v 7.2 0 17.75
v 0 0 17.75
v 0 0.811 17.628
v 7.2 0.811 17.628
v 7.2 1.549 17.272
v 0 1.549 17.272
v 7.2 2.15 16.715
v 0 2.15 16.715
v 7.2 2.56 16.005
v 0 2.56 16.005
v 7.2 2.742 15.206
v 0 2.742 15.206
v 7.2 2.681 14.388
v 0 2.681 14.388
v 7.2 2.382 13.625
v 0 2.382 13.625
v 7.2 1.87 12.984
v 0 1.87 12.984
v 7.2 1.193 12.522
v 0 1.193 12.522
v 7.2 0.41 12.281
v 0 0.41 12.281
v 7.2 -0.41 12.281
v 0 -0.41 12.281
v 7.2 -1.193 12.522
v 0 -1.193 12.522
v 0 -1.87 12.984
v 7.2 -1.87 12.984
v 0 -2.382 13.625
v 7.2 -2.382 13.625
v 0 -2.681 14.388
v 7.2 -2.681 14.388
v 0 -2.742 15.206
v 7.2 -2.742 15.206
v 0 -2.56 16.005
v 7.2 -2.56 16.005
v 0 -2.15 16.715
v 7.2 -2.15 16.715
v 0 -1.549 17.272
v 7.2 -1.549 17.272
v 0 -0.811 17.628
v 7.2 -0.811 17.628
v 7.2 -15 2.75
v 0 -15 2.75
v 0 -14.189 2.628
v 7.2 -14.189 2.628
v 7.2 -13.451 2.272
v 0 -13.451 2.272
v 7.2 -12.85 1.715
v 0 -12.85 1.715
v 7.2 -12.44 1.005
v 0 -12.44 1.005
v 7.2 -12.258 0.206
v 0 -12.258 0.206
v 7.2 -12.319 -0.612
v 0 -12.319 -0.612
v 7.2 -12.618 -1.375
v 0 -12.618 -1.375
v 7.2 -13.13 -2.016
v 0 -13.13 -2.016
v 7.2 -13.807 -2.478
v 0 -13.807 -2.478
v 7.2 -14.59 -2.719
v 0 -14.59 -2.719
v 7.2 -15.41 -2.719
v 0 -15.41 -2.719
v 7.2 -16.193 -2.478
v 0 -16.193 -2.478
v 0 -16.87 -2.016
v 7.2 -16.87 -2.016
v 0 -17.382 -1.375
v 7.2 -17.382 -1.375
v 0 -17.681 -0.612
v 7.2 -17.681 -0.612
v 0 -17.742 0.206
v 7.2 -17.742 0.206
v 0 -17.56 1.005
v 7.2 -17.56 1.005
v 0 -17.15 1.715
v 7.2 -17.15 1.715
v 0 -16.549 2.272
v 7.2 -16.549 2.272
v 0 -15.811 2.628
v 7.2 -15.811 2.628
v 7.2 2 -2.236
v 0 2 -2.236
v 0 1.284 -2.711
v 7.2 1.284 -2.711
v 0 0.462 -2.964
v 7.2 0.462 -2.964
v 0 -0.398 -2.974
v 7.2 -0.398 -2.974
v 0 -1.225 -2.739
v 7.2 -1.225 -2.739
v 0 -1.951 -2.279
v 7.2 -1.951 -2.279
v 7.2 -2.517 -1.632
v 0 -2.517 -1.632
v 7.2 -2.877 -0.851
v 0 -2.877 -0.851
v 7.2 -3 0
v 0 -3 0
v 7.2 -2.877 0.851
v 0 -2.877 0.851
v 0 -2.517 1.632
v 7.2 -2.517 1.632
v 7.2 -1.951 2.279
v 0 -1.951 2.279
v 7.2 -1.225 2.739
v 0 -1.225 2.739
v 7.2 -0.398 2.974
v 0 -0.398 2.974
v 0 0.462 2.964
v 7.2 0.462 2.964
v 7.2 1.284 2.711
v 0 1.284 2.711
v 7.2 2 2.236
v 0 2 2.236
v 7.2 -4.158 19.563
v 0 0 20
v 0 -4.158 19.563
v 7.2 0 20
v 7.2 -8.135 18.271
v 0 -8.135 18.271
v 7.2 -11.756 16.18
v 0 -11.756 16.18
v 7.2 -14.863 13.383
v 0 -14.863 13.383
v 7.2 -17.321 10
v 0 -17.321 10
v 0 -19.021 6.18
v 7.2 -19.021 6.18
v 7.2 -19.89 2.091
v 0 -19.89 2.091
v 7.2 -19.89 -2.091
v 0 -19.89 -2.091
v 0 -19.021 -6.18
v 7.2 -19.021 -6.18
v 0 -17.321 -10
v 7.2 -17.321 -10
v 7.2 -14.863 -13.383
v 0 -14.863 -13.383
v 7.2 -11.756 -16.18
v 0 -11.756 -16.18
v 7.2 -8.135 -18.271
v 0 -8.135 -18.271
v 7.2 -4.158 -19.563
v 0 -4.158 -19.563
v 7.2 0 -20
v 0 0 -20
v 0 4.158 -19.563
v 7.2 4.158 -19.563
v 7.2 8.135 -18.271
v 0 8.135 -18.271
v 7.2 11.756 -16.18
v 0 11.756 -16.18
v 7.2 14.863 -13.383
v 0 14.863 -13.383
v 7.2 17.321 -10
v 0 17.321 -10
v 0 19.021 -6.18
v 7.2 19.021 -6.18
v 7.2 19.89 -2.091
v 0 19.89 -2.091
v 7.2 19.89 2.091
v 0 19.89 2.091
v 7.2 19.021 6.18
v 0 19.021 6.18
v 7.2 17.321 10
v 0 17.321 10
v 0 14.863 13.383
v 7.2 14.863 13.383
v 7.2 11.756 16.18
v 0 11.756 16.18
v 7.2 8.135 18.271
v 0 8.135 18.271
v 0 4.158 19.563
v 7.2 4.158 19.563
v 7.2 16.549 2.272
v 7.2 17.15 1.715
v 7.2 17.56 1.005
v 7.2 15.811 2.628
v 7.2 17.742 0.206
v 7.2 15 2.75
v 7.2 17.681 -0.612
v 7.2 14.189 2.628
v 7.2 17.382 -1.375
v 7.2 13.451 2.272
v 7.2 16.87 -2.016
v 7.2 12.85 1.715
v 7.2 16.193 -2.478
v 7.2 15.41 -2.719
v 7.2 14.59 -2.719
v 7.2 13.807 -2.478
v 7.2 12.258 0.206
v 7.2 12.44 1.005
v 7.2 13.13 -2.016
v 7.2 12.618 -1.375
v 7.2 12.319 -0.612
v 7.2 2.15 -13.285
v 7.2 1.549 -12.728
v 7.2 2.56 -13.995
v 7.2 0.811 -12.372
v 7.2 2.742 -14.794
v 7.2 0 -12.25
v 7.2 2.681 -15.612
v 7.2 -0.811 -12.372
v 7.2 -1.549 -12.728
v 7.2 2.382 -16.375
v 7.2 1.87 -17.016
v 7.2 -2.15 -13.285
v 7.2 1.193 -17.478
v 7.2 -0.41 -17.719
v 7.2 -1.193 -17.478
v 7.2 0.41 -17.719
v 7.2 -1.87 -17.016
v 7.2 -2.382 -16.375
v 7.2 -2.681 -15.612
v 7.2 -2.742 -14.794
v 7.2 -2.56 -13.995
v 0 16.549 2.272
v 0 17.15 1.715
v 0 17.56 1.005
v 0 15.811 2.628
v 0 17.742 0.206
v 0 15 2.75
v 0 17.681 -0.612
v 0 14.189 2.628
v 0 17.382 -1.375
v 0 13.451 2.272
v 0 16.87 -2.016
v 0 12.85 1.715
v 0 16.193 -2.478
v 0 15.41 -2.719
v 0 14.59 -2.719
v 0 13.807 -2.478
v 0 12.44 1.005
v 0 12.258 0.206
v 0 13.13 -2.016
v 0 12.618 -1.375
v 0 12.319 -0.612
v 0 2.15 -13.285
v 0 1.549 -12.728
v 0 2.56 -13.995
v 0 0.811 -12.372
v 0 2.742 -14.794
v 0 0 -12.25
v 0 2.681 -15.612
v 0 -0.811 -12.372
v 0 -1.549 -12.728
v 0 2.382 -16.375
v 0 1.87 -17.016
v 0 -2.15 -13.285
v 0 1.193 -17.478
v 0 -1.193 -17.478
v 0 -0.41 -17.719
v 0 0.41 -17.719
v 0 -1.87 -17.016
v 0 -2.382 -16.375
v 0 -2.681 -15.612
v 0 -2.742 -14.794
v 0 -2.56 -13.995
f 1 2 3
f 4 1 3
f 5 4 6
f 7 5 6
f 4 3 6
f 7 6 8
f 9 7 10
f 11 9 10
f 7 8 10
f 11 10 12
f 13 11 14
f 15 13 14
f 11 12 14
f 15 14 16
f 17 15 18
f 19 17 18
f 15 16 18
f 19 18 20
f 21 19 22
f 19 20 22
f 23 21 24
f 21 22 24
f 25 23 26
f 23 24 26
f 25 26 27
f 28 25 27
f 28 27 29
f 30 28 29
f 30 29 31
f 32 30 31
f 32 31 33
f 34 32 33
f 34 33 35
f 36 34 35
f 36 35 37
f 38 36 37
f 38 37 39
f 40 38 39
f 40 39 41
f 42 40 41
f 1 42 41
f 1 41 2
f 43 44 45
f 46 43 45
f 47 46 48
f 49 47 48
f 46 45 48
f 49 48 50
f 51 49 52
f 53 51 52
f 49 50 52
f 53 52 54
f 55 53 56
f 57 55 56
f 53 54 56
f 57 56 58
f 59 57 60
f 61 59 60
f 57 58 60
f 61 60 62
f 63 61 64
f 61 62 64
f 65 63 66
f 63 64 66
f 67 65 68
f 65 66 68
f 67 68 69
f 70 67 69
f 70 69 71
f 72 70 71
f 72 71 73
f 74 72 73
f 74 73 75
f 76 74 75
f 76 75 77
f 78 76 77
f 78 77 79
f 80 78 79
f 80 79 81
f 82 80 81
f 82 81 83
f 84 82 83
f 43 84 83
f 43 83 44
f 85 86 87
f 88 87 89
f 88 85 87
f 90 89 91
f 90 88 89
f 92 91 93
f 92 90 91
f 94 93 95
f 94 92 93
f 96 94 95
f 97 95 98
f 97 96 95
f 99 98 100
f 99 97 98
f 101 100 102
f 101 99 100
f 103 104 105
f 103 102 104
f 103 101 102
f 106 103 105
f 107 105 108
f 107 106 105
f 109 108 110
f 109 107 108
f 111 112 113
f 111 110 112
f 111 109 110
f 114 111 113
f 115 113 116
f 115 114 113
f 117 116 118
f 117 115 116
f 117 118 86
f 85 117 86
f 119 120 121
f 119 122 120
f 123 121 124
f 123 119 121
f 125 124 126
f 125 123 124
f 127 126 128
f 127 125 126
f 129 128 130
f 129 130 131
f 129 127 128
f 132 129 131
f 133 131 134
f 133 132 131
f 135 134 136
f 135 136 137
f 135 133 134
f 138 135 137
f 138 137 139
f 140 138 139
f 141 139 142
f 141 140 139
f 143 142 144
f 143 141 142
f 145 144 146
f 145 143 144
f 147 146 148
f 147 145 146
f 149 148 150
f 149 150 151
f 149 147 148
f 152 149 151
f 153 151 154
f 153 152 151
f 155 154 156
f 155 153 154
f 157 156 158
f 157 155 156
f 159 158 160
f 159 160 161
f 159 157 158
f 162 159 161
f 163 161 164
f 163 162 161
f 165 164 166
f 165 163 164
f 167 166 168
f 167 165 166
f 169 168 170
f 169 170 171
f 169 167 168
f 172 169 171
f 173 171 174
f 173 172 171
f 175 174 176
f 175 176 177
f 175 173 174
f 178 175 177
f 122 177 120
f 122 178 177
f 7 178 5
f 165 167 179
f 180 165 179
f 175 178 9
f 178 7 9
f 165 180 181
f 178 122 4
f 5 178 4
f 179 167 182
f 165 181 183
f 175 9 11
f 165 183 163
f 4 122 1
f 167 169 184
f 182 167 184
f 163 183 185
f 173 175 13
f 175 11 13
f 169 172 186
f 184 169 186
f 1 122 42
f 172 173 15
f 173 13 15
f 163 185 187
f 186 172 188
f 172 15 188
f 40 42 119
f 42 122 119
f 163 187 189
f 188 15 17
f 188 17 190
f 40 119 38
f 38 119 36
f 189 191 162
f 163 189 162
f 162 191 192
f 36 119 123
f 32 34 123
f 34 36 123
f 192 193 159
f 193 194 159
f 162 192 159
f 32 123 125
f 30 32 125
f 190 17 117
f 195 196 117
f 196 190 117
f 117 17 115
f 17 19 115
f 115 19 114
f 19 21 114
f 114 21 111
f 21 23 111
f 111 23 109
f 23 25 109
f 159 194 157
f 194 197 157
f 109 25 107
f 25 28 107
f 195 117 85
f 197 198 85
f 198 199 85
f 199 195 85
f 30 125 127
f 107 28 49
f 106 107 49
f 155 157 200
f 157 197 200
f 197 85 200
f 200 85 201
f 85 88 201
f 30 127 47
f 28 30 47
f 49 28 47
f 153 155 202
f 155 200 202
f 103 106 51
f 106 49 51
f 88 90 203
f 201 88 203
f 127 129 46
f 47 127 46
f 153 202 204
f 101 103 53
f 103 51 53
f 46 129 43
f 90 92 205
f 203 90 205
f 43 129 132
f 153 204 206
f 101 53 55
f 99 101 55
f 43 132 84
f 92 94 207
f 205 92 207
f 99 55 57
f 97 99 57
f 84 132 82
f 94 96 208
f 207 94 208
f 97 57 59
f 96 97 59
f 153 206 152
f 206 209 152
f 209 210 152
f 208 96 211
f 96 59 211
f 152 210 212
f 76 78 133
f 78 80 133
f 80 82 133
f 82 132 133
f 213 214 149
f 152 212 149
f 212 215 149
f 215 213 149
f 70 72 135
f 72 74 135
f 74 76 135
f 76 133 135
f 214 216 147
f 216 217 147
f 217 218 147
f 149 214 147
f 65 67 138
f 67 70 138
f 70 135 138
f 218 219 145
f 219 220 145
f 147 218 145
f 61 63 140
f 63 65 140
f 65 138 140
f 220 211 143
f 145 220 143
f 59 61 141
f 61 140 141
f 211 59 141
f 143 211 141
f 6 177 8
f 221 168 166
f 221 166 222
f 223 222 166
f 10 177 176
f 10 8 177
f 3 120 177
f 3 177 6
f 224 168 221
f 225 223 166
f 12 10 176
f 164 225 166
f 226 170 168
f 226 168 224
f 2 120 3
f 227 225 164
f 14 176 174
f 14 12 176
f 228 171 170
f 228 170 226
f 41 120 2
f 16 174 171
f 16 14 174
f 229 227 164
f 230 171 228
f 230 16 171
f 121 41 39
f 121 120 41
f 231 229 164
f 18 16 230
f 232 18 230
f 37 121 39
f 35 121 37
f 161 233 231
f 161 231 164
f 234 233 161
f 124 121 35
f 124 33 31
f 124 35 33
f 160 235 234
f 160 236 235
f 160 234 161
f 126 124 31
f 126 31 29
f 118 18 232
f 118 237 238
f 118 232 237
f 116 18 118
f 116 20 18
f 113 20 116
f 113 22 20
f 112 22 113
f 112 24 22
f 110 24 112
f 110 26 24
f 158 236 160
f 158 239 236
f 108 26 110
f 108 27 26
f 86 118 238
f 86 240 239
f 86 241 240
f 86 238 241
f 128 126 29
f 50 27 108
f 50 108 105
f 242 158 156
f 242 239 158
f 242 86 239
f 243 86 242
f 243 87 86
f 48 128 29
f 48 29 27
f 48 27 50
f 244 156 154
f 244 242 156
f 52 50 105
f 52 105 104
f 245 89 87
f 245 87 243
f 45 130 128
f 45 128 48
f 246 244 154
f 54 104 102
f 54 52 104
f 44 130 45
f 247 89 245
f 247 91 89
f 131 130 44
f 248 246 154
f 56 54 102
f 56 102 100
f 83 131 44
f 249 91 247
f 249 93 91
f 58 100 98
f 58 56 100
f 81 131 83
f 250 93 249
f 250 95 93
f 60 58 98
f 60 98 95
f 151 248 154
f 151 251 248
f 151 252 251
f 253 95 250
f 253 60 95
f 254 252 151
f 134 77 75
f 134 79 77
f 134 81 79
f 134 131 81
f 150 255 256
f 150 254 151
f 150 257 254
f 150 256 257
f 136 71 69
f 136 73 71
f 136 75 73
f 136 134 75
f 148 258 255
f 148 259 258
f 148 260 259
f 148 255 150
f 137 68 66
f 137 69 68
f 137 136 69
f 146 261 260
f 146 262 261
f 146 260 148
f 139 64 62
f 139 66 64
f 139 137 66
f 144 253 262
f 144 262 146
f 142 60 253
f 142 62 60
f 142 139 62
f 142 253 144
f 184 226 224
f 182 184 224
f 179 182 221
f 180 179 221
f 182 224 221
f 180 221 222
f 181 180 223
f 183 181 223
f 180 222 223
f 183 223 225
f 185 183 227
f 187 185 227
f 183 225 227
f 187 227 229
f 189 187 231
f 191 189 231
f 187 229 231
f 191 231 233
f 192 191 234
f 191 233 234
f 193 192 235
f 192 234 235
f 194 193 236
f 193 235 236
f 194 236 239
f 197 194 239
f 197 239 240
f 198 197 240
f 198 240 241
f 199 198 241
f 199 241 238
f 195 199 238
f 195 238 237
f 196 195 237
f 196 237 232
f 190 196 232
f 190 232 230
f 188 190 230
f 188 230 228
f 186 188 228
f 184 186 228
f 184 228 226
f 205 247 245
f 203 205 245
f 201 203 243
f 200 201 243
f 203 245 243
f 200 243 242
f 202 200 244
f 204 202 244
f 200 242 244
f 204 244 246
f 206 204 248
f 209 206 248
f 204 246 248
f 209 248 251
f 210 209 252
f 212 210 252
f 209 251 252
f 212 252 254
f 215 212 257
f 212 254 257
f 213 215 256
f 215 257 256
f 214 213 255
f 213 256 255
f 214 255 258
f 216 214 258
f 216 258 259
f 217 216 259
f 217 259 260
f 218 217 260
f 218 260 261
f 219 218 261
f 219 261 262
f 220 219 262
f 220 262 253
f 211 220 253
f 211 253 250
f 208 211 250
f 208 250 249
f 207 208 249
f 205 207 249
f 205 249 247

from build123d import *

# Parameters (mm, degrees)
ESBO_O1_W               = 7.2
ESBO_O1_H               = 20
CORTE_EXTRUS_O2_DEPTH   = 30.186298155
FURO_COM_FOLGA_DE_M51_D = 5.5


with BuildPart() as part:
    # Esboço1 → Revolução1 (revolve)
    with BuildSketch(Plane.XY, mode=Mode.PRIVATE) as revolu_o1_sk:
        with Locations((3.6, 10)):
            Rectangle(ESBO_O1_W, ESBO_O1_H)
    revolve(revolu_o1_sk.sketch.rotate(Axis((-35, 0, 0), (1, 0, 0)), 90), axis=Axis((-35, 0, 0), (1, 0, 0)))

    # Esboço3 → Corte-extrusão2 (cut, through all)
    with BuildSketch(Plane(origin=(7.2, 0, 0), x_dir=(0, 0, -1), z_dir=(1, 0, 0))):
        with BuildLine():
            Line((-2.236067977, 2), (2.236067977, 2))
            ThreePointArc((2.236067977, 2), (0, -3), (-2.236067977, 2))
        make_face()
    extrude(amount=-CORTE_EXTRUS_O2_DEPTH, mode=Mode.SUBTRACT)

    # Furo com folga de M51 (through all)
    with Locations(Plane(origin=(7.2, 0, 0), x_dir=(0, 0, -1), z_dir=(1, 0, 0))):
        with Locations((0, 15), (15, 0), (0, -15), (-15, 0)):
            Hole(FURO_COM_FOLGA_DE_M51_D / 2)


solid = part.part
